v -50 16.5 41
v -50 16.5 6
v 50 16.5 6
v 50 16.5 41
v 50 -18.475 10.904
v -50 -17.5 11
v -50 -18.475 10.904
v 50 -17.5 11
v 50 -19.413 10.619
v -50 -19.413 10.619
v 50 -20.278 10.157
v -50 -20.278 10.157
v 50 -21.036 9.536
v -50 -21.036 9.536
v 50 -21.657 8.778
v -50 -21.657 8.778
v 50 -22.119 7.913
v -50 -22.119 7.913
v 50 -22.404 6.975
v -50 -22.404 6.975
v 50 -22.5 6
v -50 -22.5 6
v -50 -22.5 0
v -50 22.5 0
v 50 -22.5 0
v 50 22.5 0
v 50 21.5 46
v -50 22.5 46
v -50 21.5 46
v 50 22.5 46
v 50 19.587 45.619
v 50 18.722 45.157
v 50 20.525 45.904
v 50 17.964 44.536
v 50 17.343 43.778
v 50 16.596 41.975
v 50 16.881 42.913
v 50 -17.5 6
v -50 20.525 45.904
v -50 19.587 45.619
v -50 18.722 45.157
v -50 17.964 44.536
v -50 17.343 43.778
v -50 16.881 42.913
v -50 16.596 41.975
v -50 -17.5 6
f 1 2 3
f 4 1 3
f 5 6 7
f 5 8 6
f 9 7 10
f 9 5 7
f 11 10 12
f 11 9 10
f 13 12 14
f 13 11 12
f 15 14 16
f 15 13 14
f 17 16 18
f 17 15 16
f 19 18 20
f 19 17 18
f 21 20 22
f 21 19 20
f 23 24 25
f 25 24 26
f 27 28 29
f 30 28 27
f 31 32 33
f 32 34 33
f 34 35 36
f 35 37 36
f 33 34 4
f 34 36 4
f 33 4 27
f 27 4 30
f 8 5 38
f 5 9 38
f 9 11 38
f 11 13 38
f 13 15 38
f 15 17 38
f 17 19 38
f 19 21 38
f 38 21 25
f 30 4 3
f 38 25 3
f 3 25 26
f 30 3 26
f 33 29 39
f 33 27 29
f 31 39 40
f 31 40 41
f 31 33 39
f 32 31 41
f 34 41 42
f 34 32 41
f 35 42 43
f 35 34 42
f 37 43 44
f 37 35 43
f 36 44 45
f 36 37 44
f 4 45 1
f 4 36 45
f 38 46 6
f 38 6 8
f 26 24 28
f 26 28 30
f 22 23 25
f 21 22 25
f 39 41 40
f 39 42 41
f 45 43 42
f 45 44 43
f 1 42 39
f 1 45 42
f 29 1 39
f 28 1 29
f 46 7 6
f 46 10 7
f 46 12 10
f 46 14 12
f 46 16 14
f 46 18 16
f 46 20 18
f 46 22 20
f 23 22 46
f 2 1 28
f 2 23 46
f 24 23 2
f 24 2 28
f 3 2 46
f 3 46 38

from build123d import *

# Parameters (mm, degrees)
F0_W     = 100
F0_H     = 45
F1_DEPTH = 6
F2_W     = 100
F2_H     = 5
F3_DEPTH = 5
F4_W     = 100
F4_H     = 6
F5_DEPTH = 40
F6_R     = 4.99999
F7_R     = 5


# Not quite as in the source:
# - a fillet or chamfer is up to 0.001 mm smaller than in the source, because OpenCascade refuses the exact size


with BuildPart() as f1:
    # F0 (on Top) → F1 (new body)
    with BuildSketch(Plane.XY):
        Rectangle(F0_W, F0_H)
    extrude(amount=F1_DEPTH)

    # F2 (on face) → F3 (join)
    with BuildSketch(Plane.XY.offset(6)):
        with Locations((0, -20)):
            Rectangle(F2_W, F2_H)
    extrude(amount=F3_DEPTH)

    # F4 (on face) → F5 (join)
    with BuildSketch(Plane.XY.offset(6)):
        with Locations((0, 19.5)):
            Rectangle(F4_W, F4_H)
    extrude(amount=F5_DEPTH)

    # F6 (radius 5 in the source; OpenCascade refuses exactly that, so slightly less here)
    f6_edges = [f1.edges().sort_by_distance(p)[0] for p in [
        (0, -22.5, 11),
    ]]
    fillet(f6_edges, radius=F6_R)

    # F7
    f7_edges = [f1.edges().sort_by_distance(p)[0] for p in [
        (0, 16.5, 46),
    ]]
    fillet(f7_edges, radius=F7_R)


solid = f1.part
